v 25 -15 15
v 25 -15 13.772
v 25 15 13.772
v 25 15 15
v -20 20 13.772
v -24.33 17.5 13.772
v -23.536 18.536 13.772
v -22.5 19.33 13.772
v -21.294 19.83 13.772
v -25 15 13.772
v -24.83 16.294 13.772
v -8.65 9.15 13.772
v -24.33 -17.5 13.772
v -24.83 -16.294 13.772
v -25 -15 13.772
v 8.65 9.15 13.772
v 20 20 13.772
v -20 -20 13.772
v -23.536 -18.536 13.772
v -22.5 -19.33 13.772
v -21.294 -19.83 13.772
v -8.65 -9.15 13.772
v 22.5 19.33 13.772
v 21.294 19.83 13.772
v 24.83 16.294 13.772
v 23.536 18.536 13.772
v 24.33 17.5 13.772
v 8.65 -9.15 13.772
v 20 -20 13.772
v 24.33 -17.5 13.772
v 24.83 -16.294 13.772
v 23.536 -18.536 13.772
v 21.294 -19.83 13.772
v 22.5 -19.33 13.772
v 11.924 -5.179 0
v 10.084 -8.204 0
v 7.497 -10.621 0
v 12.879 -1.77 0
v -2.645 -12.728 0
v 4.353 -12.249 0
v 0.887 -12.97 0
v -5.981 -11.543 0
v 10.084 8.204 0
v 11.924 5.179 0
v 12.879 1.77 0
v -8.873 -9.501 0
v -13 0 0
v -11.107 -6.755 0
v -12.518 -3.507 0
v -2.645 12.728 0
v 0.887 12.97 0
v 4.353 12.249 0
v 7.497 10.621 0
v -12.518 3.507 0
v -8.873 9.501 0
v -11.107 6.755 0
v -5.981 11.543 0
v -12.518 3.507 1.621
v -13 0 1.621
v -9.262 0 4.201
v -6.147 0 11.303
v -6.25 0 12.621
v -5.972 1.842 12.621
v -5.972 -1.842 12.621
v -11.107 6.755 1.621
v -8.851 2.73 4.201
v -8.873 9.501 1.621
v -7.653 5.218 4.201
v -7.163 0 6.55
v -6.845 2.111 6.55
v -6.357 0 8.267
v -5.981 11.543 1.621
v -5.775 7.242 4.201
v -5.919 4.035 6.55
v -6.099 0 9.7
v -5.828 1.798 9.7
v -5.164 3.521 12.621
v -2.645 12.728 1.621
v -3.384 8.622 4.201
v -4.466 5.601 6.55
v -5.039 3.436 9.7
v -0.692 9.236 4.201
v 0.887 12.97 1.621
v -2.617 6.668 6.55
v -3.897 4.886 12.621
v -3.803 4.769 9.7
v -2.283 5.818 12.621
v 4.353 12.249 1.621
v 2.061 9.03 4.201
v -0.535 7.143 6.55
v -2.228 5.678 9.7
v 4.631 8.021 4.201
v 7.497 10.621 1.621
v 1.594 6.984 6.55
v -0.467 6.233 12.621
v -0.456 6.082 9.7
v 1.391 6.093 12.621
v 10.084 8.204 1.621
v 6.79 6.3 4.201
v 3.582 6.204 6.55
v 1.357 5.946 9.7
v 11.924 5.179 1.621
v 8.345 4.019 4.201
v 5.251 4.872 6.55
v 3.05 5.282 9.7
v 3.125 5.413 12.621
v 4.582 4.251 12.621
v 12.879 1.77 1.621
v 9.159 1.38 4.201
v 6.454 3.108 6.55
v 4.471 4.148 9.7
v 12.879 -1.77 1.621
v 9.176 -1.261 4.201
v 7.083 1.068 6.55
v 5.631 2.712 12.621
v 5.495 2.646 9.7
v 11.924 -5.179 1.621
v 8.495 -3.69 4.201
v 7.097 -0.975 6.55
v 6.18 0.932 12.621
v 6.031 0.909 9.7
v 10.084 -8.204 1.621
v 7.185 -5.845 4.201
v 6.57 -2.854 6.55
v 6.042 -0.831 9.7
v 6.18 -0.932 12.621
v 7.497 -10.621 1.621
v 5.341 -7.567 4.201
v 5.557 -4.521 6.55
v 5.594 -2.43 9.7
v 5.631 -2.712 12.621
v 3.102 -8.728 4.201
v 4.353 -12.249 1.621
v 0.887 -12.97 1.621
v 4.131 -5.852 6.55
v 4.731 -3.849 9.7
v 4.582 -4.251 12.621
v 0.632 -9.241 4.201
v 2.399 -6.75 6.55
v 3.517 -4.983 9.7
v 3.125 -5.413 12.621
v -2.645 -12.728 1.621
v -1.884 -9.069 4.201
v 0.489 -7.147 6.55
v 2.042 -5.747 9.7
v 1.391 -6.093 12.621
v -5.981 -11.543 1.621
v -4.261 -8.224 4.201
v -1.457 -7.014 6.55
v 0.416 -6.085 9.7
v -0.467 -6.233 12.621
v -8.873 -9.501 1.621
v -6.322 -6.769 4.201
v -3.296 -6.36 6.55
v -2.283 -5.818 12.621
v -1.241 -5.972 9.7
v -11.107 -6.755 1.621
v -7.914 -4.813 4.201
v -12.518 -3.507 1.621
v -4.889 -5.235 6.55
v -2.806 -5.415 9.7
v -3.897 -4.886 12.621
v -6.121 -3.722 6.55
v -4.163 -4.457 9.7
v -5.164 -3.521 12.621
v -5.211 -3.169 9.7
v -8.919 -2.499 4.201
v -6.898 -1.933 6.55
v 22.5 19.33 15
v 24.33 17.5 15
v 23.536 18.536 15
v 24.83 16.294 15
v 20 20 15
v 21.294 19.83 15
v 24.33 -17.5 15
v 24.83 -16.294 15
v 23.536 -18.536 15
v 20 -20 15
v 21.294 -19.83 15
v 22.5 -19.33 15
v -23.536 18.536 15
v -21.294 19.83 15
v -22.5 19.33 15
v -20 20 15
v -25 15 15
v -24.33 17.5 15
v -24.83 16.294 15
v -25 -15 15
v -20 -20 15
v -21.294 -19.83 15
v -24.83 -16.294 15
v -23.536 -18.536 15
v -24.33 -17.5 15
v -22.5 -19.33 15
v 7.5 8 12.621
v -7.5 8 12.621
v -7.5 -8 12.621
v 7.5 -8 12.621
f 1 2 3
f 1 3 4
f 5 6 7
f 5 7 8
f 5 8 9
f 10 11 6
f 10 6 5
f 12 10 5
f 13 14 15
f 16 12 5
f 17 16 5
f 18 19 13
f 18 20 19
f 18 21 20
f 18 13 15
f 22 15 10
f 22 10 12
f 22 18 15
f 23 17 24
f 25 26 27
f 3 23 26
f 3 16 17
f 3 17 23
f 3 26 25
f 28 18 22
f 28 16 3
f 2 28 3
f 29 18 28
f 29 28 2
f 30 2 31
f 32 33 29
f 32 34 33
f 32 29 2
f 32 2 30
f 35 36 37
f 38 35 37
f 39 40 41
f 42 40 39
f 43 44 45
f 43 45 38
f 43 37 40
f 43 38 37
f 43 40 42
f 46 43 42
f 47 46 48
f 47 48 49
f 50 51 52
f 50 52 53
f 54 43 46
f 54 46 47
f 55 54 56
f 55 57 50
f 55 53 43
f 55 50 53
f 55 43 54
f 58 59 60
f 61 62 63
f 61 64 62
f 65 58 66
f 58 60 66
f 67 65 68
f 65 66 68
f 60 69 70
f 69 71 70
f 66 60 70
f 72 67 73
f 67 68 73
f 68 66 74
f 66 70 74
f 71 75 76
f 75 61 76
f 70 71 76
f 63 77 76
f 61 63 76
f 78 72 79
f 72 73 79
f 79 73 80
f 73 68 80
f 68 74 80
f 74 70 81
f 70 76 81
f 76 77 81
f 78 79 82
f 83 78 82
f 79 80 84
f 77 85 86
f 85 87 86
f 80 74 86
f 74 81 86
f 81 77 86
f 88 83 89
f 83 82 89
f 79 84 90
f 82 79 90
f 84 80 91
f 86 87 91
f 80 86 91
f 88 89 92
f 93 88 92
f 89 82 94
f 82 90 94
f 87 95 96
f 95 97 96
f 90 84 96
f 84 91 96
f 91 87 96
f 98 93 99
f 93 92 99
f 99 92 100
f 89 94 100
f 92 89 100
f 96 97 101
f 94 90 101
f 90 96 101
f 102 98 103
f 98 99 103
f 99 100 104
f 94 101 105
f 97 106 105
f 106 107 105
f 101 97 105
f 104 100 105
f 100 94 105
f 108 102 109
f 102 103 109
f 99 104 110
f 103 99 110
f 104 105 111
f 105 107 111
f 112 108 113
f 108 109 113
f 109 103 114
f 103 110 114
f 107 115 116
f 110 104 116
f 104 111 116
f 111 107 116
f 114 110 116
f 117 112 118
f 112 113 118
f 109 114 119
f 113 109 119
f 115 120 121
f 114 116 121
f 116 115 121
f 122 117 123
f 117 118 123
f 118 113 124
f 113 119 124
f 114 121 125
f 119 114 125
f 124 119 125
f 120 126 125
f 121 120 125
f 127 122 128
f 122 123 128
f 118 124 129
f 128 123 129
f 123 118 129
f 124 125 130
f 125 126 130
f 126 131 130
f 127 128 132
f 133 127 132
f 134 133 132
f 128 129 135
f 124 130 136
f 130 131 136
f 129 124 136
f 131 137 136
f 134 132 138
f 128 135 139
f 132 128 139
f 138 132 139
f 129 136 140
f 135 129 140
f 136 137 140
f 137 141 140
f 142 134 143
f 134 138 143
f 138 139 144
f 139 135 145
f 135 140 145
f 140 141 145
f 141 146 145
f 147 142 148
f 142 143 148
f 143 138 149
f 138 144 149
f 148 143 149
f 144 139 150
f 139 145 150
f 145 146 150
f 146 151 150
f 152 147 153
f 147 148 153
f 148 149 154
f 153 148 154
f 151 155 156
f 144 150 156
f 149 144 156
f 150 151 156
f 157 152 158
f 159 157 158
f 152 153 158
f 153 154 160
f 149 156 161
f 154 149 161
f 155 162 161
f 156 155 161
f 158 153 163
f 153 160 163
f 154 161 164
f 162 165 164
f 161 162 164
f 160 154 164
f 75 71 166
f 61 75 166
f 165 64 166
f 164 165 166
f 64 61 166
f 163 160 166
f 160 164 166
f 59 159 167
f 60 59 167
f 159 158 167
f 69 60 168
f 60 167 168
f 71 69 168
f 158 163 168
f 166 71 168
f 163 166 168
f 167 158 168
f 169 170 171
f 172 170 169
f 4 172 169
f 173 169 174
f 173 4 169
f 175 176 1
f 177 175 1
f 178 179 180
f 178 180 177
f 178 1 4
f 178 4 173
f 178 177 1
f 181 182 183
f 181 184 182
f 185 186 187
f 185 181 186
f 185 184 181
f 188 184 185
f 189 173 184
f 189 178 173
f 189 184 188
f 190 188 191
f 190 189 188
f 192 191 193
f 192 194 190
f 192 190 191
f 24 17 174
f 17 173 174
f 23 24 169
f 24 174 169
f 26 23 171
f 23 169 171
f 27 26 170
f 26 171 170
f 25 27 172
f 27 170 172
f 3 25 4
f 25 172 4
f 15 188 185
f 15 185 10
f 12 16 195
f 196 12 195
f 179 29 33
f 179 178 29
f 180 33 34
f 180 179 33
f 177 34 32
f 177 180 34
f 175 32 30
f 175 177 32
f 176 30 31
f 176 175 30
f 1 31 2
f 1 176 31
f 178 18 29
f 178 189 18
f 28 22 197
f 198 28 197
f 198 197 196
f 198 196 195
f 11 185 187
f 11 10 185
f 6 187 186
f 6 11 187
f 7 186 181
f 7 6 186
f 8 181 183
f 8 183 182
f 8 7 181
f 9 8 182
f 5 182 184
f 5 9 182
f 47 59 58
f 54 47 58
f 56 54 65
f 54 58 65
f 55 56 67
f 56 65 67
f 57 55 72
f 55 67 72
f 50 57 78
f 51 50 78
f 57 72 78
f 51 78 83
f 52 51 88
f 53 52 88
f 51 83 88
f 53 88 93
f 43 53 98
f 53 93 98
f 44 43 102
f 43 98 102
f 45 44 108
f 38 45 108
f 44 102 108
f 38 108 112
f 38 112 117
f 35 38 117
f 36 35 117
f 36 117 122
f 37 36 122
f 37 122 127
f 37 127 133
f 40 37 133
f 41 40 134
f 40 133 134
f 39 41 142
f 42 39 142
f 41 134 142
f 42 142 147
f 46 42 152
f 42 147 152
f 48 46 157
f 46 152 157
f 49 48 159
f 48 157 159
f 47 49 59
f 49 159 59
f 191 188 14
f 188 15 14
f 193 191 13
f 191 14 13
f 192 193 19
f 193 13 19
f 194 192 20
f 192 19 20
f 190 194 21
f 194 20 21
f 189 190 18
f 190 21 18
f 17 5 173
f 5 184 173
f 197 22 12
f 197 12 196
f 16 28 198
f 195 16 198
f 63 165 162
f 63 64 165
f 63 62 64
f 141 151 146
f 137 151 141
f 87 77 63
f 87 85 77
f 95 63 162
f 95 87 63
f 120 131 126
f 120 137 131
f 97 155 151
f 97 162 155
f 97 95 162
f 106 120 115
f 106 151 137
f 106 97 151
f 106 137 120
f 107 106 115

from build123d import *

# Parameters (mm, degrees)
F1_DEPTH     = 20
F2_DEPTH     = 13
F0_W         = 13
F0_H         = 1.6210880779
F4_T4_DEPTH  = 25
F4_T9_DEPTH  = 26
F4_T14_DEPTH = 26
F4_T19_DEPTH = 25
F4_T25_DEPTH = 38.8584149398
F4_T30_DEPTH = 37.8584149398
F4_T38_DEPTH = 37.8584149398
F4_T43_DEPTH = 38.8584149398
F4_T51_DEPTH = 38.8584149398
F4_T56_DEPTH = 37.8584149398
F4_T64_DEPTH = 38.8584149398
F4_T69_DEPTH = 37.8584149398
F5_R         = 5
F6_R         = 5


# Not quite as in the source:
# - a fillet or chamfer that OpenCascade refuses, or shapes differently, is made with other operations: its cross-section is extruded or revolved along the edge and cut away or added


with BuildPart() as f1:
    # F0 (on Front) → F1 (new body, symmetric)
    with BuildSketch(Plane.XZ):
        Polygon((0, 13.7715186066), (0, 15), (-25, 15), (-25, 13.7715186066), (-12.5, 13.7715186066), align=None)
        Polygon((25, 15), (0, 15), (0, 13.7715186066), (12.5, 13.7715186066), (25, 13.7715186066), align=None)
    extrude(amount=F1_DEPTH, both=True)

    # F0 (on Front) → F2 (join, symmetric)
    with BuildSketch(Plane.XZ):
        Polygon((0, 12.6210880779), (0, 13.7715186066), (-12.5, 13.7715186066), (-12.5, 12.6210880779), (-6.25, 12.6210880779), align=None)
        Polygon((12.5, 13.7715186066), (0, 13.7715186066), (0, 12.6210880779), (6.25, 12.6210880779), (12.5, 12.6210880779), align=None)
    extrude(amount=F2_DEPTH, both=True)

    # F4: chamfer of 5 on 4 edges, made by hand


with BuildPart() as f2:
    # F0 (on Front) → F2, piece 2 (new body, symmetric)
    with BuildSketch(Plane.XZ):
        with Locations((-6.5, 0.810544039)):
            Rectangle(F0_W, F0_H)
        with Locations((6.5, 0.810544039)):
            Rectangle(F0_W, F0_H)
    extrude(amount=F2_DEPTH, both=True)

    # F5
    f5_edges = [f2.edges().sort_by_distance(p)[0] for p in [
        (-13, 13, 0.810544),
        (-13, -13, 0.810544),
        (13, -13, 0.810544),
        (13, 13, 0.810544),
    ]]
    fillet(f5_edges, radius=F5_R)


with BuildPart() as f3:
    # F0 (on Front) → F3 (revolve)
    with BuildSketch(Plane.XZ):
        with BuildLine():
            Line((0, 1.6210880779), (0, 12.6210880779))
            Line((0, 12.6210880779), (-6.25, 12.6210880779))
            add(Edge.make_bspline(
                [(-13, 1.6210880779), (-4.3921764009, 6.5395440906), (-6.2563242824, 10.3996003671), (-6.25, 12.6210880779)],
                knots=[0, 0, 0, 0, 12.9059094991, 12.9059094991, 12.9059094991, 12.9059094991], degree=3))
            Line((-13, 1.6210880779), (0, 1.6210880779))
        make_face()
    revolve(axis=Axis((0, 0, 7.5), (0, 0, -1)))

    # F0 (on Front) → F8 (revolve)
    with BuildSketch(Plane.XZ):
        with Locations((-6.5, 0.810544039)):
            Rectangle(F0_W, F0_H)
    revolve(axis=Axis((0, 0, 0.810544039), (0, 0, -1)))


with BuildPart() as f4_tool2:
    # F4_s3 → F4_t4 (new body)
    with BuildSketch(Plane.YZ.offset(-12.5)):
        with BuildLine():
            Line((13.1414213562, 17.7625094341), (7.8585786438, 12.4796667217))
            Line((7.8585786438, 12.4796667217), (7.8585786438, 12.3796667217))
            ThreePointArc((7.8585786438, 12.3796667217), (10.4292893219, 12.5210880779), (13, 12.5210880779))
            Line((13, 12.5210880779), (13.1, 12.6210880779))
            ThreePointArc((13.1, 12.6210880779), (13.1, 15.191798756), (13.2414213562, 17.7625094341))
            Line((13.2414213562, 17.7625094341), (13.1414213562, 17.7625094341))
        make_face()
    extrude(amount=F4_T4_DEPTH)

    split(bisect_by=Plane.XY.offset(13.7715186066), keep=Keep.BOTTOM)


with BuildPart() as f1_1:
    add(f1.part)

    # F4_t1: cut F4_tool2
    add(f4_tool2.part, mode=Mode.SUBTRACT)


with BuildPart() as f4_tool7:
    # F4_s8 → F4_t9 (new body)
    with BuildSketch(Plane.XZ.offset(-13)):
        with BuildLine():
            Line((-12.6414213562, 17.7625094341), (-7.3585786438, 12.4796667217))
            Line((-7.3585786438, 12.4796667217), (-7.3585786438, 12.3796667217))
            ThreePointArc((-7.3585786438, 12.3796667217), (-9.9292893219, 12.5210880779), (-12.5, 12.5210880779))
            Line((-12.5, 12.5210880779), (-12.6, 12.6210880779))
            ThreePointArc((-12.6, 12.6210880779), (-12.6, 15.191798756), (-12.7414213562, 17.7625094341))
            Line((-12.7414213562, 17.7625094341), (-12.6414213562, 17.7625094341))
        make_face()
    extrude(amount=F4_T9_DEPTH)

    split(bisect_by=Plane.XY.offset(13.7715186066), keep=Keep.BOTTOM)


with BuildPart() as f1_2:
    add(f1_1.part)

    # F4_t6: cut F4_tool7
    add(f4_tool7.part, mode=Mode.SUBTRACT)


with BuildPart() as f4_tool12:
    # F4_s13 → F4_t14 (new body)
    with BuildSketch(Plane.XZ.offset(-13)):
        with BuildLine():
            Line((12.6414213562, 17.7625094341), (7.3585786438, 12.4796667217))
            Line((7.3585786438, 12.4796667217), (7.3585786438, 12.3796667217))
            ThreePointArc((7.3585786438, 12.3796667217), (9.9292893219, 12.5210880779), (12.5, 12.5210880779))
            Line((12.5, 12.5210880779), (12.6, 12.6210880779))
            ThreePointArc((12.6, 12.6210880779), (12.6, 15.191798756), (12.7414213562, 17.7625094341))
            Line((12.7414213562, 17.7625094341), (12.6414213562, 17.7625094341))
        make_face()
    extrude(amount=F4_T14_DEPTH)

    split(bisect_by=Plane.XY.offset(13.7715186066), keep=Keep.BOTTOM)


with BuildPart() as f1_3:
    add(f1_2.part)

    # F4_t11: cut F4_tool12
    add(f4_tool12.part, mode=Mode.SUBTRACT)


with BuildPart() as f4_tool17:
    # F4_s18 → F4_t19 (new body)
    with BuildSketch(Plane.YZ.offset(-12.5)):
        with BuildLine():
            Line((-13.1414213562, 17.7625094341), (-7.8585786438, 12.4796667217))
            Line((-7.8585786438, 12.4796667217), (-7.8585786438, 12.3796667217))
            ThreePointArc((-7.8585786438, 12.3796667217), (-10.4292893219, 12.5210880779), (-13, 12.5210880779))
            Line((-13, 12.5210880779), (-13.1, 12.6210880779))
            ThreePointArc((-13.1, 12.6210880779), (-13.1, 15.191798756), (-13.2414213562, 17.7625094341))
            Line((-13.2414213562, 17.7625094341), (-13.1414213562, 17.7625094341))
        make_face()
    extrude(amount=F4_T19_DEPTH)

    split(bisect_by=Plane.XY.offset(13.7715186066), keep=Keep.BOTTOM)


with BuildPart() as f1_4:
    add(f1_3.part)

    # F4_t16: cut F4_tool17
    add(f4_tool17.part, mode=Mode.SUBTRACT)


with BuildPart() as f4_tool23:
    # F4_s24 → F4_t25 (new body)
    with BuildSketch(Plane.XZ.offset(-25.8584149398)):
        with BuildLine():
            Line((-12.6414213562, 17.7625094341), (-7.3585786438, 12.4796667217))
            Line((-7.3585786438, 12.4796667217), (-7.3585786438, 12.3796667217))
            ThreePointArc((-7.3585786438, 12.3796667217), (-9.9292893219, 12.5210880779), (-12.5, 12.5210880779))
            Line((-12.5, 12.5210880779), (-12.6, 12.6210880779))
            ThreePointArc((-12.6, 12.6210880779), (-12.6, 15.191798756), (-12.7414213562, 17.7625094341))
            Line((-12.7414213562, 17.7625094341), (-12.6414213562, 17.7625094341))
        make_face()
    extrude(amount=F4_T25_DEPTH)

    split(bisect_by=Plane.XY.offset(13.7715186066), keep=Keep.BOTTOM)

    split(bisect_by=Plane.XZ.offset(-13), keep=Keep.BOTTOM)


with BuildPart() as f4_tool28:
    # F4_s29 → F4_t30 (new body)
    with BuildSketch(Plane.YZ.offset(-25.3584149398)):
        with BuildLine():
            Line((13.1414213562, 17.7625094341), (7.8585786438, 12.4796667217))
            Line((7.8585786438, 12.4796667217), (7.8585786438, 12.3796667217))
            ThreePointArc((7.8585786438, 12.3796667217), (10.4292893219, 12.5210880779), (13, 12.5210880779))
            Line((13, 12.5210880779), (13.1, 12.6210880779))
            ThreePointArc((13.1, 12.6210880779), (13.1, 15.191798756), (13.2414213562, 17.7625094341))
            Line((13.2414213562, 17.7625094341), (13.1414213562, 17.7625094341))
        make_face()
    extrude(amount=F4_T30_DEPTH)

    split(bisect_by=Plane.XY.offset(13.7715186066), keep=Keep.BOTTOM)

    split(bisect_by=Plane.YZ.offset(-12.5), keep=Keep.BOTTOM)


with BuildPart() as f4_tool23_1:
    add(f4_tool23.part)

    # F4_t33: intersect F4_tool28
    add(f4_tool28.part, mode=Mode.INTERSECT)


with BuildPart() as f1_5:
    add(f1_4.part)

    # F4_t21: cut F4_tool23
    add(f4_tool23_1.part, mode=Mode.SUBTRACT)


with BuildPart() as f4_tool36:
    # F4_s37 → F4_t38 (new body)
    with BuildSketch(Plane.YZ.offset(-12.5)):
        with BuildLine():
            Line((13.1414213562, 17.7625094341), (7.8585786438, 12.4796667217))
            Line((7.8585786438, 12.4796667217), (7.8585786438, 12.3796667217))
            ThreePointArc((7.8585786438, 12.3796667217), (10.4292893219, 12.5210880779), (13, 12.5210880779))
            Line((13, 12.5210880779), (13.1, 12.6210880779))
            ThreePointArc((13.1, 12.6210880779), (13.1, 15.191798756), (13.2414213562, 17.7625094341))
            Line((13.2414213562, 17.7625094341), (13.1414213562, 17.7625094341))
        make_face()
    extrude(amount=F4_T38_DEPTH)

    split(bisect_by=Plane.XY.offset(13.7715186066), keep=Keep.BOTTOM)

    split(bisect_by=Plane.YZ.offset(12.5), keep=Keep.TOP)


with BuildPart() as f4_tool41:
    # F4_s42 → F4_t43 (new body)
    with BuildSketch(Plane.XZ.offset(-25.8584149398)):
        with BuildLine():
            Line((12.6414213562, 17.7625094341), (7.3585786438, 12.4796667217))
            Line((7.3585786438, 12.4796667217), (7.3585786438, 12.3796667217))
            ThreePointArc((7.3585786438, 12.3796667217), (9.9292893219, 12.5210880779), (12.5, 12.5210880779))
            Line((12.5, 12.5210880779), (12.6, 12.6210880779))
            ThreePointArc((12.6, 12.6210880779), (12.6, 15.191798756), (12.7414213562, 17.7625094341))
            Line((12.7414213562, 17.7625094341), (12.6414213562, 17.7625094341))
        make_face()
    extrude(amount=F4_T43_DEPTH)

    split(bisect_by=Plane.XY.offset(13.7715186066), keep=Keep.BOTTOM)

    split(bisect_by=Plane.XZ.offset(-13), keep=Keep.BOTTOM)


with BuildPart() as f4_tool36_1:
    add(f4_tool36.part)

    # F4_t46: intersect F4_tool41
    add(f4_tool41.part, mode=Mode.INTERSECT)


with BuildPart() as f1_6:
    add(f1_5.part)

    # F4_t34: cut F4_tool36
    add(f4_tool36_1.part, mode=Mode.SUBTRACT)


with BuildPart() as f4_tool49:
    # F4_s50 → F4_t51 (new body)
    with BuildSketch(Plane.XZ.offset(-13)):
        with BuildLine():
            Line((-12.6414213562, 17.7625094341), (-7.3585786438, 12.4796667217))
            Line((-7.3585786438, 12.4796667217), (-7.3585786438, 12.3796667217))
            ThreePointArc((-7.3585786438, 12.3796667217), (-9.9292893219, 12.5210880779), (-12.5, 12.5210880779))
            Line((-12.5, 12.5210880779), (-12.6, 12.6210880779))
            ThreePointArc((-12.6, 12.6210880779), (-12.6, 15.191798756), (-12.7414213562, 17.7625094341))
            Line((-12.7414213562, 17.7625094341), (-12.6414213562, 17.7625094341))
        make_face()
    extrude(amount=F4_T51_DEPTH)

    split(bisect_by=Plane.XY.offset(13.7715186066), keep=Keep.BOTTOM)

    split(bisect_by=Plane.XZ.offset(13), keep=Keep.TOP)


with BuildPart() as f4_tool54:
    # F4_s55 → F4_t56 (new body)
    with BuildSketch(Plane.YZ.offset(-25.3584149398)):
        with BuildLine():
            Line((-13.1414213562, 17.7625094341), (-7.8585786438, 12.4796667217))
            Line((-7.8585786438, 12.4796667217), (-7.8585786438, 12.3796667217))
            ThreePointArc((-7.8585786438, 12.3796667217), (-10.4292893219, 12.5210880779), (-13, 12.5210880779))
            Line((-13, 12.5210880779), (-13.1, 12.6210880779))
            ThreePointArc((-13.1, 12.6210880779), (-13.1, 15.191798756), (-13.2414213562, 17.7625094341))
            Line((-13.2414213562, 17.7625094341), (-13.1414213562, 17.7625094341))
        make_face()
    extrude(amount=F4_T56_DEPTH)

    split(bisect_by=Plane.XY.offset(13.7715186066), keep=Keep.BOTTOM)

    split(bisect_by=Plane.YZ.offset(-12.5), keep=Keep.BOTTOM)


with BuildPart() as f4_tool49_1:
    add(f4_tool49.part)

    # F4_t59: intersect F4_tool54
    add(f4_tool54.part, mode=Mode.INTERSECT)


with BuildPart() as f1_7:
    add(f1_6.part)

    # F4_t47: cut F4_tool49
    add(f4_tool49_1.part, mode=Mode.SUBTRACT)


with BuildPart() as f4_tool62:
    # F4_s63 → F4_t64 (new body)
    with BuildSketch(Plane.XZ.offset(-13)):
        with BuildLine():
            Line((12.6414213562, 17.7625094341), (7.3585786438, 12.4796667217))
            Line((7.3585786438, 12.4796667217), (7.3585786438, 12.3796667217))
            ThreePointArc((7.3585786438, 12.3796667217), (9.9292893219, 12.5210880779), (12.5, 12.5210880779))
            Line((12.5, 12.5210880779), (12.6, 12.6210880779))
            ThreePointArc((12.6, 12.6210880779), (12.6, 15.191798756), (12.7414213562, 17.7625094341))
            Line((12.7414213562, 17.7625094341), (12.6414213562, 17.7625094341))
        make_face()
    extrude(amount=F4_T64_DEPTH)

    split(bisect_by=Plane.XY.offset(13.7715186066), keep=Keep.BOTTOM)

    split(bisect_by=Plane.XZ.offset(13), keep=Keep.TOP)


with BuildPart() as f4_tool67:
    # F4_s68 → F4_t69 (new body)
    with BuildSketch(Plane.YZ.offset(-12.5)):
        with BuildLine():
            Line((-13.1414213562, 17.7625094341), (-7.8585786438, 12.4796667217))
            Line((-7.8585786438, 12.4796667217), (-7.8585786438, 12.3796667217))
            ThreePointArc((-7.8585786438, 12.3796667217), (-10.4292893219, 12.5210880779), (-13, 12.5210880779))
            Line((-13, 12.5210880779), (-13.1, 12.6210880779))
            ThreePointArc((-13.1, 12.6210880779), (-13.1, 15.191798756), (-13.2414213562, 17.7625094341))
            Line((-13.2414213562, 17.7625094341), (-13.1414213562, 17.7625094341))
        make_face()
    extrude(amount=F4_T69_DEPTH)

    split(bisect_by=Plane.XY.offset(13.7715186066), keep=Keep.BOTTOM)

    split(bisect_by=Plane.YZ.offset(12.5), keep=Keep.TOP)


with BuildPart() as f4_tool62_1:
    add(f4_tool62.part)

    # F4_t72: intersect F4_tool67
    add(f4_tool67.part, mode=Mode.INTERSECT)


with BuildPart() as f1_8:
    add(f1_7.part)

    # F4_t60: cut F4_tool62
    add(f4_tool62_1.part, mode=Mode.SUBTRACT)

    # F6
    f6_edges = [f1_8.edges().sort_by_distance(p)[0] for p in [
        (-25, -20, 14.385759),
        (-25, 20, 14.385759),
        (25, -20, 14.385759),
        (25, 20, 14.385759),
    ]]
    fillet(f6_edges, radius=F6_R)


solid = Compound([f3.part, f1_8.part])
